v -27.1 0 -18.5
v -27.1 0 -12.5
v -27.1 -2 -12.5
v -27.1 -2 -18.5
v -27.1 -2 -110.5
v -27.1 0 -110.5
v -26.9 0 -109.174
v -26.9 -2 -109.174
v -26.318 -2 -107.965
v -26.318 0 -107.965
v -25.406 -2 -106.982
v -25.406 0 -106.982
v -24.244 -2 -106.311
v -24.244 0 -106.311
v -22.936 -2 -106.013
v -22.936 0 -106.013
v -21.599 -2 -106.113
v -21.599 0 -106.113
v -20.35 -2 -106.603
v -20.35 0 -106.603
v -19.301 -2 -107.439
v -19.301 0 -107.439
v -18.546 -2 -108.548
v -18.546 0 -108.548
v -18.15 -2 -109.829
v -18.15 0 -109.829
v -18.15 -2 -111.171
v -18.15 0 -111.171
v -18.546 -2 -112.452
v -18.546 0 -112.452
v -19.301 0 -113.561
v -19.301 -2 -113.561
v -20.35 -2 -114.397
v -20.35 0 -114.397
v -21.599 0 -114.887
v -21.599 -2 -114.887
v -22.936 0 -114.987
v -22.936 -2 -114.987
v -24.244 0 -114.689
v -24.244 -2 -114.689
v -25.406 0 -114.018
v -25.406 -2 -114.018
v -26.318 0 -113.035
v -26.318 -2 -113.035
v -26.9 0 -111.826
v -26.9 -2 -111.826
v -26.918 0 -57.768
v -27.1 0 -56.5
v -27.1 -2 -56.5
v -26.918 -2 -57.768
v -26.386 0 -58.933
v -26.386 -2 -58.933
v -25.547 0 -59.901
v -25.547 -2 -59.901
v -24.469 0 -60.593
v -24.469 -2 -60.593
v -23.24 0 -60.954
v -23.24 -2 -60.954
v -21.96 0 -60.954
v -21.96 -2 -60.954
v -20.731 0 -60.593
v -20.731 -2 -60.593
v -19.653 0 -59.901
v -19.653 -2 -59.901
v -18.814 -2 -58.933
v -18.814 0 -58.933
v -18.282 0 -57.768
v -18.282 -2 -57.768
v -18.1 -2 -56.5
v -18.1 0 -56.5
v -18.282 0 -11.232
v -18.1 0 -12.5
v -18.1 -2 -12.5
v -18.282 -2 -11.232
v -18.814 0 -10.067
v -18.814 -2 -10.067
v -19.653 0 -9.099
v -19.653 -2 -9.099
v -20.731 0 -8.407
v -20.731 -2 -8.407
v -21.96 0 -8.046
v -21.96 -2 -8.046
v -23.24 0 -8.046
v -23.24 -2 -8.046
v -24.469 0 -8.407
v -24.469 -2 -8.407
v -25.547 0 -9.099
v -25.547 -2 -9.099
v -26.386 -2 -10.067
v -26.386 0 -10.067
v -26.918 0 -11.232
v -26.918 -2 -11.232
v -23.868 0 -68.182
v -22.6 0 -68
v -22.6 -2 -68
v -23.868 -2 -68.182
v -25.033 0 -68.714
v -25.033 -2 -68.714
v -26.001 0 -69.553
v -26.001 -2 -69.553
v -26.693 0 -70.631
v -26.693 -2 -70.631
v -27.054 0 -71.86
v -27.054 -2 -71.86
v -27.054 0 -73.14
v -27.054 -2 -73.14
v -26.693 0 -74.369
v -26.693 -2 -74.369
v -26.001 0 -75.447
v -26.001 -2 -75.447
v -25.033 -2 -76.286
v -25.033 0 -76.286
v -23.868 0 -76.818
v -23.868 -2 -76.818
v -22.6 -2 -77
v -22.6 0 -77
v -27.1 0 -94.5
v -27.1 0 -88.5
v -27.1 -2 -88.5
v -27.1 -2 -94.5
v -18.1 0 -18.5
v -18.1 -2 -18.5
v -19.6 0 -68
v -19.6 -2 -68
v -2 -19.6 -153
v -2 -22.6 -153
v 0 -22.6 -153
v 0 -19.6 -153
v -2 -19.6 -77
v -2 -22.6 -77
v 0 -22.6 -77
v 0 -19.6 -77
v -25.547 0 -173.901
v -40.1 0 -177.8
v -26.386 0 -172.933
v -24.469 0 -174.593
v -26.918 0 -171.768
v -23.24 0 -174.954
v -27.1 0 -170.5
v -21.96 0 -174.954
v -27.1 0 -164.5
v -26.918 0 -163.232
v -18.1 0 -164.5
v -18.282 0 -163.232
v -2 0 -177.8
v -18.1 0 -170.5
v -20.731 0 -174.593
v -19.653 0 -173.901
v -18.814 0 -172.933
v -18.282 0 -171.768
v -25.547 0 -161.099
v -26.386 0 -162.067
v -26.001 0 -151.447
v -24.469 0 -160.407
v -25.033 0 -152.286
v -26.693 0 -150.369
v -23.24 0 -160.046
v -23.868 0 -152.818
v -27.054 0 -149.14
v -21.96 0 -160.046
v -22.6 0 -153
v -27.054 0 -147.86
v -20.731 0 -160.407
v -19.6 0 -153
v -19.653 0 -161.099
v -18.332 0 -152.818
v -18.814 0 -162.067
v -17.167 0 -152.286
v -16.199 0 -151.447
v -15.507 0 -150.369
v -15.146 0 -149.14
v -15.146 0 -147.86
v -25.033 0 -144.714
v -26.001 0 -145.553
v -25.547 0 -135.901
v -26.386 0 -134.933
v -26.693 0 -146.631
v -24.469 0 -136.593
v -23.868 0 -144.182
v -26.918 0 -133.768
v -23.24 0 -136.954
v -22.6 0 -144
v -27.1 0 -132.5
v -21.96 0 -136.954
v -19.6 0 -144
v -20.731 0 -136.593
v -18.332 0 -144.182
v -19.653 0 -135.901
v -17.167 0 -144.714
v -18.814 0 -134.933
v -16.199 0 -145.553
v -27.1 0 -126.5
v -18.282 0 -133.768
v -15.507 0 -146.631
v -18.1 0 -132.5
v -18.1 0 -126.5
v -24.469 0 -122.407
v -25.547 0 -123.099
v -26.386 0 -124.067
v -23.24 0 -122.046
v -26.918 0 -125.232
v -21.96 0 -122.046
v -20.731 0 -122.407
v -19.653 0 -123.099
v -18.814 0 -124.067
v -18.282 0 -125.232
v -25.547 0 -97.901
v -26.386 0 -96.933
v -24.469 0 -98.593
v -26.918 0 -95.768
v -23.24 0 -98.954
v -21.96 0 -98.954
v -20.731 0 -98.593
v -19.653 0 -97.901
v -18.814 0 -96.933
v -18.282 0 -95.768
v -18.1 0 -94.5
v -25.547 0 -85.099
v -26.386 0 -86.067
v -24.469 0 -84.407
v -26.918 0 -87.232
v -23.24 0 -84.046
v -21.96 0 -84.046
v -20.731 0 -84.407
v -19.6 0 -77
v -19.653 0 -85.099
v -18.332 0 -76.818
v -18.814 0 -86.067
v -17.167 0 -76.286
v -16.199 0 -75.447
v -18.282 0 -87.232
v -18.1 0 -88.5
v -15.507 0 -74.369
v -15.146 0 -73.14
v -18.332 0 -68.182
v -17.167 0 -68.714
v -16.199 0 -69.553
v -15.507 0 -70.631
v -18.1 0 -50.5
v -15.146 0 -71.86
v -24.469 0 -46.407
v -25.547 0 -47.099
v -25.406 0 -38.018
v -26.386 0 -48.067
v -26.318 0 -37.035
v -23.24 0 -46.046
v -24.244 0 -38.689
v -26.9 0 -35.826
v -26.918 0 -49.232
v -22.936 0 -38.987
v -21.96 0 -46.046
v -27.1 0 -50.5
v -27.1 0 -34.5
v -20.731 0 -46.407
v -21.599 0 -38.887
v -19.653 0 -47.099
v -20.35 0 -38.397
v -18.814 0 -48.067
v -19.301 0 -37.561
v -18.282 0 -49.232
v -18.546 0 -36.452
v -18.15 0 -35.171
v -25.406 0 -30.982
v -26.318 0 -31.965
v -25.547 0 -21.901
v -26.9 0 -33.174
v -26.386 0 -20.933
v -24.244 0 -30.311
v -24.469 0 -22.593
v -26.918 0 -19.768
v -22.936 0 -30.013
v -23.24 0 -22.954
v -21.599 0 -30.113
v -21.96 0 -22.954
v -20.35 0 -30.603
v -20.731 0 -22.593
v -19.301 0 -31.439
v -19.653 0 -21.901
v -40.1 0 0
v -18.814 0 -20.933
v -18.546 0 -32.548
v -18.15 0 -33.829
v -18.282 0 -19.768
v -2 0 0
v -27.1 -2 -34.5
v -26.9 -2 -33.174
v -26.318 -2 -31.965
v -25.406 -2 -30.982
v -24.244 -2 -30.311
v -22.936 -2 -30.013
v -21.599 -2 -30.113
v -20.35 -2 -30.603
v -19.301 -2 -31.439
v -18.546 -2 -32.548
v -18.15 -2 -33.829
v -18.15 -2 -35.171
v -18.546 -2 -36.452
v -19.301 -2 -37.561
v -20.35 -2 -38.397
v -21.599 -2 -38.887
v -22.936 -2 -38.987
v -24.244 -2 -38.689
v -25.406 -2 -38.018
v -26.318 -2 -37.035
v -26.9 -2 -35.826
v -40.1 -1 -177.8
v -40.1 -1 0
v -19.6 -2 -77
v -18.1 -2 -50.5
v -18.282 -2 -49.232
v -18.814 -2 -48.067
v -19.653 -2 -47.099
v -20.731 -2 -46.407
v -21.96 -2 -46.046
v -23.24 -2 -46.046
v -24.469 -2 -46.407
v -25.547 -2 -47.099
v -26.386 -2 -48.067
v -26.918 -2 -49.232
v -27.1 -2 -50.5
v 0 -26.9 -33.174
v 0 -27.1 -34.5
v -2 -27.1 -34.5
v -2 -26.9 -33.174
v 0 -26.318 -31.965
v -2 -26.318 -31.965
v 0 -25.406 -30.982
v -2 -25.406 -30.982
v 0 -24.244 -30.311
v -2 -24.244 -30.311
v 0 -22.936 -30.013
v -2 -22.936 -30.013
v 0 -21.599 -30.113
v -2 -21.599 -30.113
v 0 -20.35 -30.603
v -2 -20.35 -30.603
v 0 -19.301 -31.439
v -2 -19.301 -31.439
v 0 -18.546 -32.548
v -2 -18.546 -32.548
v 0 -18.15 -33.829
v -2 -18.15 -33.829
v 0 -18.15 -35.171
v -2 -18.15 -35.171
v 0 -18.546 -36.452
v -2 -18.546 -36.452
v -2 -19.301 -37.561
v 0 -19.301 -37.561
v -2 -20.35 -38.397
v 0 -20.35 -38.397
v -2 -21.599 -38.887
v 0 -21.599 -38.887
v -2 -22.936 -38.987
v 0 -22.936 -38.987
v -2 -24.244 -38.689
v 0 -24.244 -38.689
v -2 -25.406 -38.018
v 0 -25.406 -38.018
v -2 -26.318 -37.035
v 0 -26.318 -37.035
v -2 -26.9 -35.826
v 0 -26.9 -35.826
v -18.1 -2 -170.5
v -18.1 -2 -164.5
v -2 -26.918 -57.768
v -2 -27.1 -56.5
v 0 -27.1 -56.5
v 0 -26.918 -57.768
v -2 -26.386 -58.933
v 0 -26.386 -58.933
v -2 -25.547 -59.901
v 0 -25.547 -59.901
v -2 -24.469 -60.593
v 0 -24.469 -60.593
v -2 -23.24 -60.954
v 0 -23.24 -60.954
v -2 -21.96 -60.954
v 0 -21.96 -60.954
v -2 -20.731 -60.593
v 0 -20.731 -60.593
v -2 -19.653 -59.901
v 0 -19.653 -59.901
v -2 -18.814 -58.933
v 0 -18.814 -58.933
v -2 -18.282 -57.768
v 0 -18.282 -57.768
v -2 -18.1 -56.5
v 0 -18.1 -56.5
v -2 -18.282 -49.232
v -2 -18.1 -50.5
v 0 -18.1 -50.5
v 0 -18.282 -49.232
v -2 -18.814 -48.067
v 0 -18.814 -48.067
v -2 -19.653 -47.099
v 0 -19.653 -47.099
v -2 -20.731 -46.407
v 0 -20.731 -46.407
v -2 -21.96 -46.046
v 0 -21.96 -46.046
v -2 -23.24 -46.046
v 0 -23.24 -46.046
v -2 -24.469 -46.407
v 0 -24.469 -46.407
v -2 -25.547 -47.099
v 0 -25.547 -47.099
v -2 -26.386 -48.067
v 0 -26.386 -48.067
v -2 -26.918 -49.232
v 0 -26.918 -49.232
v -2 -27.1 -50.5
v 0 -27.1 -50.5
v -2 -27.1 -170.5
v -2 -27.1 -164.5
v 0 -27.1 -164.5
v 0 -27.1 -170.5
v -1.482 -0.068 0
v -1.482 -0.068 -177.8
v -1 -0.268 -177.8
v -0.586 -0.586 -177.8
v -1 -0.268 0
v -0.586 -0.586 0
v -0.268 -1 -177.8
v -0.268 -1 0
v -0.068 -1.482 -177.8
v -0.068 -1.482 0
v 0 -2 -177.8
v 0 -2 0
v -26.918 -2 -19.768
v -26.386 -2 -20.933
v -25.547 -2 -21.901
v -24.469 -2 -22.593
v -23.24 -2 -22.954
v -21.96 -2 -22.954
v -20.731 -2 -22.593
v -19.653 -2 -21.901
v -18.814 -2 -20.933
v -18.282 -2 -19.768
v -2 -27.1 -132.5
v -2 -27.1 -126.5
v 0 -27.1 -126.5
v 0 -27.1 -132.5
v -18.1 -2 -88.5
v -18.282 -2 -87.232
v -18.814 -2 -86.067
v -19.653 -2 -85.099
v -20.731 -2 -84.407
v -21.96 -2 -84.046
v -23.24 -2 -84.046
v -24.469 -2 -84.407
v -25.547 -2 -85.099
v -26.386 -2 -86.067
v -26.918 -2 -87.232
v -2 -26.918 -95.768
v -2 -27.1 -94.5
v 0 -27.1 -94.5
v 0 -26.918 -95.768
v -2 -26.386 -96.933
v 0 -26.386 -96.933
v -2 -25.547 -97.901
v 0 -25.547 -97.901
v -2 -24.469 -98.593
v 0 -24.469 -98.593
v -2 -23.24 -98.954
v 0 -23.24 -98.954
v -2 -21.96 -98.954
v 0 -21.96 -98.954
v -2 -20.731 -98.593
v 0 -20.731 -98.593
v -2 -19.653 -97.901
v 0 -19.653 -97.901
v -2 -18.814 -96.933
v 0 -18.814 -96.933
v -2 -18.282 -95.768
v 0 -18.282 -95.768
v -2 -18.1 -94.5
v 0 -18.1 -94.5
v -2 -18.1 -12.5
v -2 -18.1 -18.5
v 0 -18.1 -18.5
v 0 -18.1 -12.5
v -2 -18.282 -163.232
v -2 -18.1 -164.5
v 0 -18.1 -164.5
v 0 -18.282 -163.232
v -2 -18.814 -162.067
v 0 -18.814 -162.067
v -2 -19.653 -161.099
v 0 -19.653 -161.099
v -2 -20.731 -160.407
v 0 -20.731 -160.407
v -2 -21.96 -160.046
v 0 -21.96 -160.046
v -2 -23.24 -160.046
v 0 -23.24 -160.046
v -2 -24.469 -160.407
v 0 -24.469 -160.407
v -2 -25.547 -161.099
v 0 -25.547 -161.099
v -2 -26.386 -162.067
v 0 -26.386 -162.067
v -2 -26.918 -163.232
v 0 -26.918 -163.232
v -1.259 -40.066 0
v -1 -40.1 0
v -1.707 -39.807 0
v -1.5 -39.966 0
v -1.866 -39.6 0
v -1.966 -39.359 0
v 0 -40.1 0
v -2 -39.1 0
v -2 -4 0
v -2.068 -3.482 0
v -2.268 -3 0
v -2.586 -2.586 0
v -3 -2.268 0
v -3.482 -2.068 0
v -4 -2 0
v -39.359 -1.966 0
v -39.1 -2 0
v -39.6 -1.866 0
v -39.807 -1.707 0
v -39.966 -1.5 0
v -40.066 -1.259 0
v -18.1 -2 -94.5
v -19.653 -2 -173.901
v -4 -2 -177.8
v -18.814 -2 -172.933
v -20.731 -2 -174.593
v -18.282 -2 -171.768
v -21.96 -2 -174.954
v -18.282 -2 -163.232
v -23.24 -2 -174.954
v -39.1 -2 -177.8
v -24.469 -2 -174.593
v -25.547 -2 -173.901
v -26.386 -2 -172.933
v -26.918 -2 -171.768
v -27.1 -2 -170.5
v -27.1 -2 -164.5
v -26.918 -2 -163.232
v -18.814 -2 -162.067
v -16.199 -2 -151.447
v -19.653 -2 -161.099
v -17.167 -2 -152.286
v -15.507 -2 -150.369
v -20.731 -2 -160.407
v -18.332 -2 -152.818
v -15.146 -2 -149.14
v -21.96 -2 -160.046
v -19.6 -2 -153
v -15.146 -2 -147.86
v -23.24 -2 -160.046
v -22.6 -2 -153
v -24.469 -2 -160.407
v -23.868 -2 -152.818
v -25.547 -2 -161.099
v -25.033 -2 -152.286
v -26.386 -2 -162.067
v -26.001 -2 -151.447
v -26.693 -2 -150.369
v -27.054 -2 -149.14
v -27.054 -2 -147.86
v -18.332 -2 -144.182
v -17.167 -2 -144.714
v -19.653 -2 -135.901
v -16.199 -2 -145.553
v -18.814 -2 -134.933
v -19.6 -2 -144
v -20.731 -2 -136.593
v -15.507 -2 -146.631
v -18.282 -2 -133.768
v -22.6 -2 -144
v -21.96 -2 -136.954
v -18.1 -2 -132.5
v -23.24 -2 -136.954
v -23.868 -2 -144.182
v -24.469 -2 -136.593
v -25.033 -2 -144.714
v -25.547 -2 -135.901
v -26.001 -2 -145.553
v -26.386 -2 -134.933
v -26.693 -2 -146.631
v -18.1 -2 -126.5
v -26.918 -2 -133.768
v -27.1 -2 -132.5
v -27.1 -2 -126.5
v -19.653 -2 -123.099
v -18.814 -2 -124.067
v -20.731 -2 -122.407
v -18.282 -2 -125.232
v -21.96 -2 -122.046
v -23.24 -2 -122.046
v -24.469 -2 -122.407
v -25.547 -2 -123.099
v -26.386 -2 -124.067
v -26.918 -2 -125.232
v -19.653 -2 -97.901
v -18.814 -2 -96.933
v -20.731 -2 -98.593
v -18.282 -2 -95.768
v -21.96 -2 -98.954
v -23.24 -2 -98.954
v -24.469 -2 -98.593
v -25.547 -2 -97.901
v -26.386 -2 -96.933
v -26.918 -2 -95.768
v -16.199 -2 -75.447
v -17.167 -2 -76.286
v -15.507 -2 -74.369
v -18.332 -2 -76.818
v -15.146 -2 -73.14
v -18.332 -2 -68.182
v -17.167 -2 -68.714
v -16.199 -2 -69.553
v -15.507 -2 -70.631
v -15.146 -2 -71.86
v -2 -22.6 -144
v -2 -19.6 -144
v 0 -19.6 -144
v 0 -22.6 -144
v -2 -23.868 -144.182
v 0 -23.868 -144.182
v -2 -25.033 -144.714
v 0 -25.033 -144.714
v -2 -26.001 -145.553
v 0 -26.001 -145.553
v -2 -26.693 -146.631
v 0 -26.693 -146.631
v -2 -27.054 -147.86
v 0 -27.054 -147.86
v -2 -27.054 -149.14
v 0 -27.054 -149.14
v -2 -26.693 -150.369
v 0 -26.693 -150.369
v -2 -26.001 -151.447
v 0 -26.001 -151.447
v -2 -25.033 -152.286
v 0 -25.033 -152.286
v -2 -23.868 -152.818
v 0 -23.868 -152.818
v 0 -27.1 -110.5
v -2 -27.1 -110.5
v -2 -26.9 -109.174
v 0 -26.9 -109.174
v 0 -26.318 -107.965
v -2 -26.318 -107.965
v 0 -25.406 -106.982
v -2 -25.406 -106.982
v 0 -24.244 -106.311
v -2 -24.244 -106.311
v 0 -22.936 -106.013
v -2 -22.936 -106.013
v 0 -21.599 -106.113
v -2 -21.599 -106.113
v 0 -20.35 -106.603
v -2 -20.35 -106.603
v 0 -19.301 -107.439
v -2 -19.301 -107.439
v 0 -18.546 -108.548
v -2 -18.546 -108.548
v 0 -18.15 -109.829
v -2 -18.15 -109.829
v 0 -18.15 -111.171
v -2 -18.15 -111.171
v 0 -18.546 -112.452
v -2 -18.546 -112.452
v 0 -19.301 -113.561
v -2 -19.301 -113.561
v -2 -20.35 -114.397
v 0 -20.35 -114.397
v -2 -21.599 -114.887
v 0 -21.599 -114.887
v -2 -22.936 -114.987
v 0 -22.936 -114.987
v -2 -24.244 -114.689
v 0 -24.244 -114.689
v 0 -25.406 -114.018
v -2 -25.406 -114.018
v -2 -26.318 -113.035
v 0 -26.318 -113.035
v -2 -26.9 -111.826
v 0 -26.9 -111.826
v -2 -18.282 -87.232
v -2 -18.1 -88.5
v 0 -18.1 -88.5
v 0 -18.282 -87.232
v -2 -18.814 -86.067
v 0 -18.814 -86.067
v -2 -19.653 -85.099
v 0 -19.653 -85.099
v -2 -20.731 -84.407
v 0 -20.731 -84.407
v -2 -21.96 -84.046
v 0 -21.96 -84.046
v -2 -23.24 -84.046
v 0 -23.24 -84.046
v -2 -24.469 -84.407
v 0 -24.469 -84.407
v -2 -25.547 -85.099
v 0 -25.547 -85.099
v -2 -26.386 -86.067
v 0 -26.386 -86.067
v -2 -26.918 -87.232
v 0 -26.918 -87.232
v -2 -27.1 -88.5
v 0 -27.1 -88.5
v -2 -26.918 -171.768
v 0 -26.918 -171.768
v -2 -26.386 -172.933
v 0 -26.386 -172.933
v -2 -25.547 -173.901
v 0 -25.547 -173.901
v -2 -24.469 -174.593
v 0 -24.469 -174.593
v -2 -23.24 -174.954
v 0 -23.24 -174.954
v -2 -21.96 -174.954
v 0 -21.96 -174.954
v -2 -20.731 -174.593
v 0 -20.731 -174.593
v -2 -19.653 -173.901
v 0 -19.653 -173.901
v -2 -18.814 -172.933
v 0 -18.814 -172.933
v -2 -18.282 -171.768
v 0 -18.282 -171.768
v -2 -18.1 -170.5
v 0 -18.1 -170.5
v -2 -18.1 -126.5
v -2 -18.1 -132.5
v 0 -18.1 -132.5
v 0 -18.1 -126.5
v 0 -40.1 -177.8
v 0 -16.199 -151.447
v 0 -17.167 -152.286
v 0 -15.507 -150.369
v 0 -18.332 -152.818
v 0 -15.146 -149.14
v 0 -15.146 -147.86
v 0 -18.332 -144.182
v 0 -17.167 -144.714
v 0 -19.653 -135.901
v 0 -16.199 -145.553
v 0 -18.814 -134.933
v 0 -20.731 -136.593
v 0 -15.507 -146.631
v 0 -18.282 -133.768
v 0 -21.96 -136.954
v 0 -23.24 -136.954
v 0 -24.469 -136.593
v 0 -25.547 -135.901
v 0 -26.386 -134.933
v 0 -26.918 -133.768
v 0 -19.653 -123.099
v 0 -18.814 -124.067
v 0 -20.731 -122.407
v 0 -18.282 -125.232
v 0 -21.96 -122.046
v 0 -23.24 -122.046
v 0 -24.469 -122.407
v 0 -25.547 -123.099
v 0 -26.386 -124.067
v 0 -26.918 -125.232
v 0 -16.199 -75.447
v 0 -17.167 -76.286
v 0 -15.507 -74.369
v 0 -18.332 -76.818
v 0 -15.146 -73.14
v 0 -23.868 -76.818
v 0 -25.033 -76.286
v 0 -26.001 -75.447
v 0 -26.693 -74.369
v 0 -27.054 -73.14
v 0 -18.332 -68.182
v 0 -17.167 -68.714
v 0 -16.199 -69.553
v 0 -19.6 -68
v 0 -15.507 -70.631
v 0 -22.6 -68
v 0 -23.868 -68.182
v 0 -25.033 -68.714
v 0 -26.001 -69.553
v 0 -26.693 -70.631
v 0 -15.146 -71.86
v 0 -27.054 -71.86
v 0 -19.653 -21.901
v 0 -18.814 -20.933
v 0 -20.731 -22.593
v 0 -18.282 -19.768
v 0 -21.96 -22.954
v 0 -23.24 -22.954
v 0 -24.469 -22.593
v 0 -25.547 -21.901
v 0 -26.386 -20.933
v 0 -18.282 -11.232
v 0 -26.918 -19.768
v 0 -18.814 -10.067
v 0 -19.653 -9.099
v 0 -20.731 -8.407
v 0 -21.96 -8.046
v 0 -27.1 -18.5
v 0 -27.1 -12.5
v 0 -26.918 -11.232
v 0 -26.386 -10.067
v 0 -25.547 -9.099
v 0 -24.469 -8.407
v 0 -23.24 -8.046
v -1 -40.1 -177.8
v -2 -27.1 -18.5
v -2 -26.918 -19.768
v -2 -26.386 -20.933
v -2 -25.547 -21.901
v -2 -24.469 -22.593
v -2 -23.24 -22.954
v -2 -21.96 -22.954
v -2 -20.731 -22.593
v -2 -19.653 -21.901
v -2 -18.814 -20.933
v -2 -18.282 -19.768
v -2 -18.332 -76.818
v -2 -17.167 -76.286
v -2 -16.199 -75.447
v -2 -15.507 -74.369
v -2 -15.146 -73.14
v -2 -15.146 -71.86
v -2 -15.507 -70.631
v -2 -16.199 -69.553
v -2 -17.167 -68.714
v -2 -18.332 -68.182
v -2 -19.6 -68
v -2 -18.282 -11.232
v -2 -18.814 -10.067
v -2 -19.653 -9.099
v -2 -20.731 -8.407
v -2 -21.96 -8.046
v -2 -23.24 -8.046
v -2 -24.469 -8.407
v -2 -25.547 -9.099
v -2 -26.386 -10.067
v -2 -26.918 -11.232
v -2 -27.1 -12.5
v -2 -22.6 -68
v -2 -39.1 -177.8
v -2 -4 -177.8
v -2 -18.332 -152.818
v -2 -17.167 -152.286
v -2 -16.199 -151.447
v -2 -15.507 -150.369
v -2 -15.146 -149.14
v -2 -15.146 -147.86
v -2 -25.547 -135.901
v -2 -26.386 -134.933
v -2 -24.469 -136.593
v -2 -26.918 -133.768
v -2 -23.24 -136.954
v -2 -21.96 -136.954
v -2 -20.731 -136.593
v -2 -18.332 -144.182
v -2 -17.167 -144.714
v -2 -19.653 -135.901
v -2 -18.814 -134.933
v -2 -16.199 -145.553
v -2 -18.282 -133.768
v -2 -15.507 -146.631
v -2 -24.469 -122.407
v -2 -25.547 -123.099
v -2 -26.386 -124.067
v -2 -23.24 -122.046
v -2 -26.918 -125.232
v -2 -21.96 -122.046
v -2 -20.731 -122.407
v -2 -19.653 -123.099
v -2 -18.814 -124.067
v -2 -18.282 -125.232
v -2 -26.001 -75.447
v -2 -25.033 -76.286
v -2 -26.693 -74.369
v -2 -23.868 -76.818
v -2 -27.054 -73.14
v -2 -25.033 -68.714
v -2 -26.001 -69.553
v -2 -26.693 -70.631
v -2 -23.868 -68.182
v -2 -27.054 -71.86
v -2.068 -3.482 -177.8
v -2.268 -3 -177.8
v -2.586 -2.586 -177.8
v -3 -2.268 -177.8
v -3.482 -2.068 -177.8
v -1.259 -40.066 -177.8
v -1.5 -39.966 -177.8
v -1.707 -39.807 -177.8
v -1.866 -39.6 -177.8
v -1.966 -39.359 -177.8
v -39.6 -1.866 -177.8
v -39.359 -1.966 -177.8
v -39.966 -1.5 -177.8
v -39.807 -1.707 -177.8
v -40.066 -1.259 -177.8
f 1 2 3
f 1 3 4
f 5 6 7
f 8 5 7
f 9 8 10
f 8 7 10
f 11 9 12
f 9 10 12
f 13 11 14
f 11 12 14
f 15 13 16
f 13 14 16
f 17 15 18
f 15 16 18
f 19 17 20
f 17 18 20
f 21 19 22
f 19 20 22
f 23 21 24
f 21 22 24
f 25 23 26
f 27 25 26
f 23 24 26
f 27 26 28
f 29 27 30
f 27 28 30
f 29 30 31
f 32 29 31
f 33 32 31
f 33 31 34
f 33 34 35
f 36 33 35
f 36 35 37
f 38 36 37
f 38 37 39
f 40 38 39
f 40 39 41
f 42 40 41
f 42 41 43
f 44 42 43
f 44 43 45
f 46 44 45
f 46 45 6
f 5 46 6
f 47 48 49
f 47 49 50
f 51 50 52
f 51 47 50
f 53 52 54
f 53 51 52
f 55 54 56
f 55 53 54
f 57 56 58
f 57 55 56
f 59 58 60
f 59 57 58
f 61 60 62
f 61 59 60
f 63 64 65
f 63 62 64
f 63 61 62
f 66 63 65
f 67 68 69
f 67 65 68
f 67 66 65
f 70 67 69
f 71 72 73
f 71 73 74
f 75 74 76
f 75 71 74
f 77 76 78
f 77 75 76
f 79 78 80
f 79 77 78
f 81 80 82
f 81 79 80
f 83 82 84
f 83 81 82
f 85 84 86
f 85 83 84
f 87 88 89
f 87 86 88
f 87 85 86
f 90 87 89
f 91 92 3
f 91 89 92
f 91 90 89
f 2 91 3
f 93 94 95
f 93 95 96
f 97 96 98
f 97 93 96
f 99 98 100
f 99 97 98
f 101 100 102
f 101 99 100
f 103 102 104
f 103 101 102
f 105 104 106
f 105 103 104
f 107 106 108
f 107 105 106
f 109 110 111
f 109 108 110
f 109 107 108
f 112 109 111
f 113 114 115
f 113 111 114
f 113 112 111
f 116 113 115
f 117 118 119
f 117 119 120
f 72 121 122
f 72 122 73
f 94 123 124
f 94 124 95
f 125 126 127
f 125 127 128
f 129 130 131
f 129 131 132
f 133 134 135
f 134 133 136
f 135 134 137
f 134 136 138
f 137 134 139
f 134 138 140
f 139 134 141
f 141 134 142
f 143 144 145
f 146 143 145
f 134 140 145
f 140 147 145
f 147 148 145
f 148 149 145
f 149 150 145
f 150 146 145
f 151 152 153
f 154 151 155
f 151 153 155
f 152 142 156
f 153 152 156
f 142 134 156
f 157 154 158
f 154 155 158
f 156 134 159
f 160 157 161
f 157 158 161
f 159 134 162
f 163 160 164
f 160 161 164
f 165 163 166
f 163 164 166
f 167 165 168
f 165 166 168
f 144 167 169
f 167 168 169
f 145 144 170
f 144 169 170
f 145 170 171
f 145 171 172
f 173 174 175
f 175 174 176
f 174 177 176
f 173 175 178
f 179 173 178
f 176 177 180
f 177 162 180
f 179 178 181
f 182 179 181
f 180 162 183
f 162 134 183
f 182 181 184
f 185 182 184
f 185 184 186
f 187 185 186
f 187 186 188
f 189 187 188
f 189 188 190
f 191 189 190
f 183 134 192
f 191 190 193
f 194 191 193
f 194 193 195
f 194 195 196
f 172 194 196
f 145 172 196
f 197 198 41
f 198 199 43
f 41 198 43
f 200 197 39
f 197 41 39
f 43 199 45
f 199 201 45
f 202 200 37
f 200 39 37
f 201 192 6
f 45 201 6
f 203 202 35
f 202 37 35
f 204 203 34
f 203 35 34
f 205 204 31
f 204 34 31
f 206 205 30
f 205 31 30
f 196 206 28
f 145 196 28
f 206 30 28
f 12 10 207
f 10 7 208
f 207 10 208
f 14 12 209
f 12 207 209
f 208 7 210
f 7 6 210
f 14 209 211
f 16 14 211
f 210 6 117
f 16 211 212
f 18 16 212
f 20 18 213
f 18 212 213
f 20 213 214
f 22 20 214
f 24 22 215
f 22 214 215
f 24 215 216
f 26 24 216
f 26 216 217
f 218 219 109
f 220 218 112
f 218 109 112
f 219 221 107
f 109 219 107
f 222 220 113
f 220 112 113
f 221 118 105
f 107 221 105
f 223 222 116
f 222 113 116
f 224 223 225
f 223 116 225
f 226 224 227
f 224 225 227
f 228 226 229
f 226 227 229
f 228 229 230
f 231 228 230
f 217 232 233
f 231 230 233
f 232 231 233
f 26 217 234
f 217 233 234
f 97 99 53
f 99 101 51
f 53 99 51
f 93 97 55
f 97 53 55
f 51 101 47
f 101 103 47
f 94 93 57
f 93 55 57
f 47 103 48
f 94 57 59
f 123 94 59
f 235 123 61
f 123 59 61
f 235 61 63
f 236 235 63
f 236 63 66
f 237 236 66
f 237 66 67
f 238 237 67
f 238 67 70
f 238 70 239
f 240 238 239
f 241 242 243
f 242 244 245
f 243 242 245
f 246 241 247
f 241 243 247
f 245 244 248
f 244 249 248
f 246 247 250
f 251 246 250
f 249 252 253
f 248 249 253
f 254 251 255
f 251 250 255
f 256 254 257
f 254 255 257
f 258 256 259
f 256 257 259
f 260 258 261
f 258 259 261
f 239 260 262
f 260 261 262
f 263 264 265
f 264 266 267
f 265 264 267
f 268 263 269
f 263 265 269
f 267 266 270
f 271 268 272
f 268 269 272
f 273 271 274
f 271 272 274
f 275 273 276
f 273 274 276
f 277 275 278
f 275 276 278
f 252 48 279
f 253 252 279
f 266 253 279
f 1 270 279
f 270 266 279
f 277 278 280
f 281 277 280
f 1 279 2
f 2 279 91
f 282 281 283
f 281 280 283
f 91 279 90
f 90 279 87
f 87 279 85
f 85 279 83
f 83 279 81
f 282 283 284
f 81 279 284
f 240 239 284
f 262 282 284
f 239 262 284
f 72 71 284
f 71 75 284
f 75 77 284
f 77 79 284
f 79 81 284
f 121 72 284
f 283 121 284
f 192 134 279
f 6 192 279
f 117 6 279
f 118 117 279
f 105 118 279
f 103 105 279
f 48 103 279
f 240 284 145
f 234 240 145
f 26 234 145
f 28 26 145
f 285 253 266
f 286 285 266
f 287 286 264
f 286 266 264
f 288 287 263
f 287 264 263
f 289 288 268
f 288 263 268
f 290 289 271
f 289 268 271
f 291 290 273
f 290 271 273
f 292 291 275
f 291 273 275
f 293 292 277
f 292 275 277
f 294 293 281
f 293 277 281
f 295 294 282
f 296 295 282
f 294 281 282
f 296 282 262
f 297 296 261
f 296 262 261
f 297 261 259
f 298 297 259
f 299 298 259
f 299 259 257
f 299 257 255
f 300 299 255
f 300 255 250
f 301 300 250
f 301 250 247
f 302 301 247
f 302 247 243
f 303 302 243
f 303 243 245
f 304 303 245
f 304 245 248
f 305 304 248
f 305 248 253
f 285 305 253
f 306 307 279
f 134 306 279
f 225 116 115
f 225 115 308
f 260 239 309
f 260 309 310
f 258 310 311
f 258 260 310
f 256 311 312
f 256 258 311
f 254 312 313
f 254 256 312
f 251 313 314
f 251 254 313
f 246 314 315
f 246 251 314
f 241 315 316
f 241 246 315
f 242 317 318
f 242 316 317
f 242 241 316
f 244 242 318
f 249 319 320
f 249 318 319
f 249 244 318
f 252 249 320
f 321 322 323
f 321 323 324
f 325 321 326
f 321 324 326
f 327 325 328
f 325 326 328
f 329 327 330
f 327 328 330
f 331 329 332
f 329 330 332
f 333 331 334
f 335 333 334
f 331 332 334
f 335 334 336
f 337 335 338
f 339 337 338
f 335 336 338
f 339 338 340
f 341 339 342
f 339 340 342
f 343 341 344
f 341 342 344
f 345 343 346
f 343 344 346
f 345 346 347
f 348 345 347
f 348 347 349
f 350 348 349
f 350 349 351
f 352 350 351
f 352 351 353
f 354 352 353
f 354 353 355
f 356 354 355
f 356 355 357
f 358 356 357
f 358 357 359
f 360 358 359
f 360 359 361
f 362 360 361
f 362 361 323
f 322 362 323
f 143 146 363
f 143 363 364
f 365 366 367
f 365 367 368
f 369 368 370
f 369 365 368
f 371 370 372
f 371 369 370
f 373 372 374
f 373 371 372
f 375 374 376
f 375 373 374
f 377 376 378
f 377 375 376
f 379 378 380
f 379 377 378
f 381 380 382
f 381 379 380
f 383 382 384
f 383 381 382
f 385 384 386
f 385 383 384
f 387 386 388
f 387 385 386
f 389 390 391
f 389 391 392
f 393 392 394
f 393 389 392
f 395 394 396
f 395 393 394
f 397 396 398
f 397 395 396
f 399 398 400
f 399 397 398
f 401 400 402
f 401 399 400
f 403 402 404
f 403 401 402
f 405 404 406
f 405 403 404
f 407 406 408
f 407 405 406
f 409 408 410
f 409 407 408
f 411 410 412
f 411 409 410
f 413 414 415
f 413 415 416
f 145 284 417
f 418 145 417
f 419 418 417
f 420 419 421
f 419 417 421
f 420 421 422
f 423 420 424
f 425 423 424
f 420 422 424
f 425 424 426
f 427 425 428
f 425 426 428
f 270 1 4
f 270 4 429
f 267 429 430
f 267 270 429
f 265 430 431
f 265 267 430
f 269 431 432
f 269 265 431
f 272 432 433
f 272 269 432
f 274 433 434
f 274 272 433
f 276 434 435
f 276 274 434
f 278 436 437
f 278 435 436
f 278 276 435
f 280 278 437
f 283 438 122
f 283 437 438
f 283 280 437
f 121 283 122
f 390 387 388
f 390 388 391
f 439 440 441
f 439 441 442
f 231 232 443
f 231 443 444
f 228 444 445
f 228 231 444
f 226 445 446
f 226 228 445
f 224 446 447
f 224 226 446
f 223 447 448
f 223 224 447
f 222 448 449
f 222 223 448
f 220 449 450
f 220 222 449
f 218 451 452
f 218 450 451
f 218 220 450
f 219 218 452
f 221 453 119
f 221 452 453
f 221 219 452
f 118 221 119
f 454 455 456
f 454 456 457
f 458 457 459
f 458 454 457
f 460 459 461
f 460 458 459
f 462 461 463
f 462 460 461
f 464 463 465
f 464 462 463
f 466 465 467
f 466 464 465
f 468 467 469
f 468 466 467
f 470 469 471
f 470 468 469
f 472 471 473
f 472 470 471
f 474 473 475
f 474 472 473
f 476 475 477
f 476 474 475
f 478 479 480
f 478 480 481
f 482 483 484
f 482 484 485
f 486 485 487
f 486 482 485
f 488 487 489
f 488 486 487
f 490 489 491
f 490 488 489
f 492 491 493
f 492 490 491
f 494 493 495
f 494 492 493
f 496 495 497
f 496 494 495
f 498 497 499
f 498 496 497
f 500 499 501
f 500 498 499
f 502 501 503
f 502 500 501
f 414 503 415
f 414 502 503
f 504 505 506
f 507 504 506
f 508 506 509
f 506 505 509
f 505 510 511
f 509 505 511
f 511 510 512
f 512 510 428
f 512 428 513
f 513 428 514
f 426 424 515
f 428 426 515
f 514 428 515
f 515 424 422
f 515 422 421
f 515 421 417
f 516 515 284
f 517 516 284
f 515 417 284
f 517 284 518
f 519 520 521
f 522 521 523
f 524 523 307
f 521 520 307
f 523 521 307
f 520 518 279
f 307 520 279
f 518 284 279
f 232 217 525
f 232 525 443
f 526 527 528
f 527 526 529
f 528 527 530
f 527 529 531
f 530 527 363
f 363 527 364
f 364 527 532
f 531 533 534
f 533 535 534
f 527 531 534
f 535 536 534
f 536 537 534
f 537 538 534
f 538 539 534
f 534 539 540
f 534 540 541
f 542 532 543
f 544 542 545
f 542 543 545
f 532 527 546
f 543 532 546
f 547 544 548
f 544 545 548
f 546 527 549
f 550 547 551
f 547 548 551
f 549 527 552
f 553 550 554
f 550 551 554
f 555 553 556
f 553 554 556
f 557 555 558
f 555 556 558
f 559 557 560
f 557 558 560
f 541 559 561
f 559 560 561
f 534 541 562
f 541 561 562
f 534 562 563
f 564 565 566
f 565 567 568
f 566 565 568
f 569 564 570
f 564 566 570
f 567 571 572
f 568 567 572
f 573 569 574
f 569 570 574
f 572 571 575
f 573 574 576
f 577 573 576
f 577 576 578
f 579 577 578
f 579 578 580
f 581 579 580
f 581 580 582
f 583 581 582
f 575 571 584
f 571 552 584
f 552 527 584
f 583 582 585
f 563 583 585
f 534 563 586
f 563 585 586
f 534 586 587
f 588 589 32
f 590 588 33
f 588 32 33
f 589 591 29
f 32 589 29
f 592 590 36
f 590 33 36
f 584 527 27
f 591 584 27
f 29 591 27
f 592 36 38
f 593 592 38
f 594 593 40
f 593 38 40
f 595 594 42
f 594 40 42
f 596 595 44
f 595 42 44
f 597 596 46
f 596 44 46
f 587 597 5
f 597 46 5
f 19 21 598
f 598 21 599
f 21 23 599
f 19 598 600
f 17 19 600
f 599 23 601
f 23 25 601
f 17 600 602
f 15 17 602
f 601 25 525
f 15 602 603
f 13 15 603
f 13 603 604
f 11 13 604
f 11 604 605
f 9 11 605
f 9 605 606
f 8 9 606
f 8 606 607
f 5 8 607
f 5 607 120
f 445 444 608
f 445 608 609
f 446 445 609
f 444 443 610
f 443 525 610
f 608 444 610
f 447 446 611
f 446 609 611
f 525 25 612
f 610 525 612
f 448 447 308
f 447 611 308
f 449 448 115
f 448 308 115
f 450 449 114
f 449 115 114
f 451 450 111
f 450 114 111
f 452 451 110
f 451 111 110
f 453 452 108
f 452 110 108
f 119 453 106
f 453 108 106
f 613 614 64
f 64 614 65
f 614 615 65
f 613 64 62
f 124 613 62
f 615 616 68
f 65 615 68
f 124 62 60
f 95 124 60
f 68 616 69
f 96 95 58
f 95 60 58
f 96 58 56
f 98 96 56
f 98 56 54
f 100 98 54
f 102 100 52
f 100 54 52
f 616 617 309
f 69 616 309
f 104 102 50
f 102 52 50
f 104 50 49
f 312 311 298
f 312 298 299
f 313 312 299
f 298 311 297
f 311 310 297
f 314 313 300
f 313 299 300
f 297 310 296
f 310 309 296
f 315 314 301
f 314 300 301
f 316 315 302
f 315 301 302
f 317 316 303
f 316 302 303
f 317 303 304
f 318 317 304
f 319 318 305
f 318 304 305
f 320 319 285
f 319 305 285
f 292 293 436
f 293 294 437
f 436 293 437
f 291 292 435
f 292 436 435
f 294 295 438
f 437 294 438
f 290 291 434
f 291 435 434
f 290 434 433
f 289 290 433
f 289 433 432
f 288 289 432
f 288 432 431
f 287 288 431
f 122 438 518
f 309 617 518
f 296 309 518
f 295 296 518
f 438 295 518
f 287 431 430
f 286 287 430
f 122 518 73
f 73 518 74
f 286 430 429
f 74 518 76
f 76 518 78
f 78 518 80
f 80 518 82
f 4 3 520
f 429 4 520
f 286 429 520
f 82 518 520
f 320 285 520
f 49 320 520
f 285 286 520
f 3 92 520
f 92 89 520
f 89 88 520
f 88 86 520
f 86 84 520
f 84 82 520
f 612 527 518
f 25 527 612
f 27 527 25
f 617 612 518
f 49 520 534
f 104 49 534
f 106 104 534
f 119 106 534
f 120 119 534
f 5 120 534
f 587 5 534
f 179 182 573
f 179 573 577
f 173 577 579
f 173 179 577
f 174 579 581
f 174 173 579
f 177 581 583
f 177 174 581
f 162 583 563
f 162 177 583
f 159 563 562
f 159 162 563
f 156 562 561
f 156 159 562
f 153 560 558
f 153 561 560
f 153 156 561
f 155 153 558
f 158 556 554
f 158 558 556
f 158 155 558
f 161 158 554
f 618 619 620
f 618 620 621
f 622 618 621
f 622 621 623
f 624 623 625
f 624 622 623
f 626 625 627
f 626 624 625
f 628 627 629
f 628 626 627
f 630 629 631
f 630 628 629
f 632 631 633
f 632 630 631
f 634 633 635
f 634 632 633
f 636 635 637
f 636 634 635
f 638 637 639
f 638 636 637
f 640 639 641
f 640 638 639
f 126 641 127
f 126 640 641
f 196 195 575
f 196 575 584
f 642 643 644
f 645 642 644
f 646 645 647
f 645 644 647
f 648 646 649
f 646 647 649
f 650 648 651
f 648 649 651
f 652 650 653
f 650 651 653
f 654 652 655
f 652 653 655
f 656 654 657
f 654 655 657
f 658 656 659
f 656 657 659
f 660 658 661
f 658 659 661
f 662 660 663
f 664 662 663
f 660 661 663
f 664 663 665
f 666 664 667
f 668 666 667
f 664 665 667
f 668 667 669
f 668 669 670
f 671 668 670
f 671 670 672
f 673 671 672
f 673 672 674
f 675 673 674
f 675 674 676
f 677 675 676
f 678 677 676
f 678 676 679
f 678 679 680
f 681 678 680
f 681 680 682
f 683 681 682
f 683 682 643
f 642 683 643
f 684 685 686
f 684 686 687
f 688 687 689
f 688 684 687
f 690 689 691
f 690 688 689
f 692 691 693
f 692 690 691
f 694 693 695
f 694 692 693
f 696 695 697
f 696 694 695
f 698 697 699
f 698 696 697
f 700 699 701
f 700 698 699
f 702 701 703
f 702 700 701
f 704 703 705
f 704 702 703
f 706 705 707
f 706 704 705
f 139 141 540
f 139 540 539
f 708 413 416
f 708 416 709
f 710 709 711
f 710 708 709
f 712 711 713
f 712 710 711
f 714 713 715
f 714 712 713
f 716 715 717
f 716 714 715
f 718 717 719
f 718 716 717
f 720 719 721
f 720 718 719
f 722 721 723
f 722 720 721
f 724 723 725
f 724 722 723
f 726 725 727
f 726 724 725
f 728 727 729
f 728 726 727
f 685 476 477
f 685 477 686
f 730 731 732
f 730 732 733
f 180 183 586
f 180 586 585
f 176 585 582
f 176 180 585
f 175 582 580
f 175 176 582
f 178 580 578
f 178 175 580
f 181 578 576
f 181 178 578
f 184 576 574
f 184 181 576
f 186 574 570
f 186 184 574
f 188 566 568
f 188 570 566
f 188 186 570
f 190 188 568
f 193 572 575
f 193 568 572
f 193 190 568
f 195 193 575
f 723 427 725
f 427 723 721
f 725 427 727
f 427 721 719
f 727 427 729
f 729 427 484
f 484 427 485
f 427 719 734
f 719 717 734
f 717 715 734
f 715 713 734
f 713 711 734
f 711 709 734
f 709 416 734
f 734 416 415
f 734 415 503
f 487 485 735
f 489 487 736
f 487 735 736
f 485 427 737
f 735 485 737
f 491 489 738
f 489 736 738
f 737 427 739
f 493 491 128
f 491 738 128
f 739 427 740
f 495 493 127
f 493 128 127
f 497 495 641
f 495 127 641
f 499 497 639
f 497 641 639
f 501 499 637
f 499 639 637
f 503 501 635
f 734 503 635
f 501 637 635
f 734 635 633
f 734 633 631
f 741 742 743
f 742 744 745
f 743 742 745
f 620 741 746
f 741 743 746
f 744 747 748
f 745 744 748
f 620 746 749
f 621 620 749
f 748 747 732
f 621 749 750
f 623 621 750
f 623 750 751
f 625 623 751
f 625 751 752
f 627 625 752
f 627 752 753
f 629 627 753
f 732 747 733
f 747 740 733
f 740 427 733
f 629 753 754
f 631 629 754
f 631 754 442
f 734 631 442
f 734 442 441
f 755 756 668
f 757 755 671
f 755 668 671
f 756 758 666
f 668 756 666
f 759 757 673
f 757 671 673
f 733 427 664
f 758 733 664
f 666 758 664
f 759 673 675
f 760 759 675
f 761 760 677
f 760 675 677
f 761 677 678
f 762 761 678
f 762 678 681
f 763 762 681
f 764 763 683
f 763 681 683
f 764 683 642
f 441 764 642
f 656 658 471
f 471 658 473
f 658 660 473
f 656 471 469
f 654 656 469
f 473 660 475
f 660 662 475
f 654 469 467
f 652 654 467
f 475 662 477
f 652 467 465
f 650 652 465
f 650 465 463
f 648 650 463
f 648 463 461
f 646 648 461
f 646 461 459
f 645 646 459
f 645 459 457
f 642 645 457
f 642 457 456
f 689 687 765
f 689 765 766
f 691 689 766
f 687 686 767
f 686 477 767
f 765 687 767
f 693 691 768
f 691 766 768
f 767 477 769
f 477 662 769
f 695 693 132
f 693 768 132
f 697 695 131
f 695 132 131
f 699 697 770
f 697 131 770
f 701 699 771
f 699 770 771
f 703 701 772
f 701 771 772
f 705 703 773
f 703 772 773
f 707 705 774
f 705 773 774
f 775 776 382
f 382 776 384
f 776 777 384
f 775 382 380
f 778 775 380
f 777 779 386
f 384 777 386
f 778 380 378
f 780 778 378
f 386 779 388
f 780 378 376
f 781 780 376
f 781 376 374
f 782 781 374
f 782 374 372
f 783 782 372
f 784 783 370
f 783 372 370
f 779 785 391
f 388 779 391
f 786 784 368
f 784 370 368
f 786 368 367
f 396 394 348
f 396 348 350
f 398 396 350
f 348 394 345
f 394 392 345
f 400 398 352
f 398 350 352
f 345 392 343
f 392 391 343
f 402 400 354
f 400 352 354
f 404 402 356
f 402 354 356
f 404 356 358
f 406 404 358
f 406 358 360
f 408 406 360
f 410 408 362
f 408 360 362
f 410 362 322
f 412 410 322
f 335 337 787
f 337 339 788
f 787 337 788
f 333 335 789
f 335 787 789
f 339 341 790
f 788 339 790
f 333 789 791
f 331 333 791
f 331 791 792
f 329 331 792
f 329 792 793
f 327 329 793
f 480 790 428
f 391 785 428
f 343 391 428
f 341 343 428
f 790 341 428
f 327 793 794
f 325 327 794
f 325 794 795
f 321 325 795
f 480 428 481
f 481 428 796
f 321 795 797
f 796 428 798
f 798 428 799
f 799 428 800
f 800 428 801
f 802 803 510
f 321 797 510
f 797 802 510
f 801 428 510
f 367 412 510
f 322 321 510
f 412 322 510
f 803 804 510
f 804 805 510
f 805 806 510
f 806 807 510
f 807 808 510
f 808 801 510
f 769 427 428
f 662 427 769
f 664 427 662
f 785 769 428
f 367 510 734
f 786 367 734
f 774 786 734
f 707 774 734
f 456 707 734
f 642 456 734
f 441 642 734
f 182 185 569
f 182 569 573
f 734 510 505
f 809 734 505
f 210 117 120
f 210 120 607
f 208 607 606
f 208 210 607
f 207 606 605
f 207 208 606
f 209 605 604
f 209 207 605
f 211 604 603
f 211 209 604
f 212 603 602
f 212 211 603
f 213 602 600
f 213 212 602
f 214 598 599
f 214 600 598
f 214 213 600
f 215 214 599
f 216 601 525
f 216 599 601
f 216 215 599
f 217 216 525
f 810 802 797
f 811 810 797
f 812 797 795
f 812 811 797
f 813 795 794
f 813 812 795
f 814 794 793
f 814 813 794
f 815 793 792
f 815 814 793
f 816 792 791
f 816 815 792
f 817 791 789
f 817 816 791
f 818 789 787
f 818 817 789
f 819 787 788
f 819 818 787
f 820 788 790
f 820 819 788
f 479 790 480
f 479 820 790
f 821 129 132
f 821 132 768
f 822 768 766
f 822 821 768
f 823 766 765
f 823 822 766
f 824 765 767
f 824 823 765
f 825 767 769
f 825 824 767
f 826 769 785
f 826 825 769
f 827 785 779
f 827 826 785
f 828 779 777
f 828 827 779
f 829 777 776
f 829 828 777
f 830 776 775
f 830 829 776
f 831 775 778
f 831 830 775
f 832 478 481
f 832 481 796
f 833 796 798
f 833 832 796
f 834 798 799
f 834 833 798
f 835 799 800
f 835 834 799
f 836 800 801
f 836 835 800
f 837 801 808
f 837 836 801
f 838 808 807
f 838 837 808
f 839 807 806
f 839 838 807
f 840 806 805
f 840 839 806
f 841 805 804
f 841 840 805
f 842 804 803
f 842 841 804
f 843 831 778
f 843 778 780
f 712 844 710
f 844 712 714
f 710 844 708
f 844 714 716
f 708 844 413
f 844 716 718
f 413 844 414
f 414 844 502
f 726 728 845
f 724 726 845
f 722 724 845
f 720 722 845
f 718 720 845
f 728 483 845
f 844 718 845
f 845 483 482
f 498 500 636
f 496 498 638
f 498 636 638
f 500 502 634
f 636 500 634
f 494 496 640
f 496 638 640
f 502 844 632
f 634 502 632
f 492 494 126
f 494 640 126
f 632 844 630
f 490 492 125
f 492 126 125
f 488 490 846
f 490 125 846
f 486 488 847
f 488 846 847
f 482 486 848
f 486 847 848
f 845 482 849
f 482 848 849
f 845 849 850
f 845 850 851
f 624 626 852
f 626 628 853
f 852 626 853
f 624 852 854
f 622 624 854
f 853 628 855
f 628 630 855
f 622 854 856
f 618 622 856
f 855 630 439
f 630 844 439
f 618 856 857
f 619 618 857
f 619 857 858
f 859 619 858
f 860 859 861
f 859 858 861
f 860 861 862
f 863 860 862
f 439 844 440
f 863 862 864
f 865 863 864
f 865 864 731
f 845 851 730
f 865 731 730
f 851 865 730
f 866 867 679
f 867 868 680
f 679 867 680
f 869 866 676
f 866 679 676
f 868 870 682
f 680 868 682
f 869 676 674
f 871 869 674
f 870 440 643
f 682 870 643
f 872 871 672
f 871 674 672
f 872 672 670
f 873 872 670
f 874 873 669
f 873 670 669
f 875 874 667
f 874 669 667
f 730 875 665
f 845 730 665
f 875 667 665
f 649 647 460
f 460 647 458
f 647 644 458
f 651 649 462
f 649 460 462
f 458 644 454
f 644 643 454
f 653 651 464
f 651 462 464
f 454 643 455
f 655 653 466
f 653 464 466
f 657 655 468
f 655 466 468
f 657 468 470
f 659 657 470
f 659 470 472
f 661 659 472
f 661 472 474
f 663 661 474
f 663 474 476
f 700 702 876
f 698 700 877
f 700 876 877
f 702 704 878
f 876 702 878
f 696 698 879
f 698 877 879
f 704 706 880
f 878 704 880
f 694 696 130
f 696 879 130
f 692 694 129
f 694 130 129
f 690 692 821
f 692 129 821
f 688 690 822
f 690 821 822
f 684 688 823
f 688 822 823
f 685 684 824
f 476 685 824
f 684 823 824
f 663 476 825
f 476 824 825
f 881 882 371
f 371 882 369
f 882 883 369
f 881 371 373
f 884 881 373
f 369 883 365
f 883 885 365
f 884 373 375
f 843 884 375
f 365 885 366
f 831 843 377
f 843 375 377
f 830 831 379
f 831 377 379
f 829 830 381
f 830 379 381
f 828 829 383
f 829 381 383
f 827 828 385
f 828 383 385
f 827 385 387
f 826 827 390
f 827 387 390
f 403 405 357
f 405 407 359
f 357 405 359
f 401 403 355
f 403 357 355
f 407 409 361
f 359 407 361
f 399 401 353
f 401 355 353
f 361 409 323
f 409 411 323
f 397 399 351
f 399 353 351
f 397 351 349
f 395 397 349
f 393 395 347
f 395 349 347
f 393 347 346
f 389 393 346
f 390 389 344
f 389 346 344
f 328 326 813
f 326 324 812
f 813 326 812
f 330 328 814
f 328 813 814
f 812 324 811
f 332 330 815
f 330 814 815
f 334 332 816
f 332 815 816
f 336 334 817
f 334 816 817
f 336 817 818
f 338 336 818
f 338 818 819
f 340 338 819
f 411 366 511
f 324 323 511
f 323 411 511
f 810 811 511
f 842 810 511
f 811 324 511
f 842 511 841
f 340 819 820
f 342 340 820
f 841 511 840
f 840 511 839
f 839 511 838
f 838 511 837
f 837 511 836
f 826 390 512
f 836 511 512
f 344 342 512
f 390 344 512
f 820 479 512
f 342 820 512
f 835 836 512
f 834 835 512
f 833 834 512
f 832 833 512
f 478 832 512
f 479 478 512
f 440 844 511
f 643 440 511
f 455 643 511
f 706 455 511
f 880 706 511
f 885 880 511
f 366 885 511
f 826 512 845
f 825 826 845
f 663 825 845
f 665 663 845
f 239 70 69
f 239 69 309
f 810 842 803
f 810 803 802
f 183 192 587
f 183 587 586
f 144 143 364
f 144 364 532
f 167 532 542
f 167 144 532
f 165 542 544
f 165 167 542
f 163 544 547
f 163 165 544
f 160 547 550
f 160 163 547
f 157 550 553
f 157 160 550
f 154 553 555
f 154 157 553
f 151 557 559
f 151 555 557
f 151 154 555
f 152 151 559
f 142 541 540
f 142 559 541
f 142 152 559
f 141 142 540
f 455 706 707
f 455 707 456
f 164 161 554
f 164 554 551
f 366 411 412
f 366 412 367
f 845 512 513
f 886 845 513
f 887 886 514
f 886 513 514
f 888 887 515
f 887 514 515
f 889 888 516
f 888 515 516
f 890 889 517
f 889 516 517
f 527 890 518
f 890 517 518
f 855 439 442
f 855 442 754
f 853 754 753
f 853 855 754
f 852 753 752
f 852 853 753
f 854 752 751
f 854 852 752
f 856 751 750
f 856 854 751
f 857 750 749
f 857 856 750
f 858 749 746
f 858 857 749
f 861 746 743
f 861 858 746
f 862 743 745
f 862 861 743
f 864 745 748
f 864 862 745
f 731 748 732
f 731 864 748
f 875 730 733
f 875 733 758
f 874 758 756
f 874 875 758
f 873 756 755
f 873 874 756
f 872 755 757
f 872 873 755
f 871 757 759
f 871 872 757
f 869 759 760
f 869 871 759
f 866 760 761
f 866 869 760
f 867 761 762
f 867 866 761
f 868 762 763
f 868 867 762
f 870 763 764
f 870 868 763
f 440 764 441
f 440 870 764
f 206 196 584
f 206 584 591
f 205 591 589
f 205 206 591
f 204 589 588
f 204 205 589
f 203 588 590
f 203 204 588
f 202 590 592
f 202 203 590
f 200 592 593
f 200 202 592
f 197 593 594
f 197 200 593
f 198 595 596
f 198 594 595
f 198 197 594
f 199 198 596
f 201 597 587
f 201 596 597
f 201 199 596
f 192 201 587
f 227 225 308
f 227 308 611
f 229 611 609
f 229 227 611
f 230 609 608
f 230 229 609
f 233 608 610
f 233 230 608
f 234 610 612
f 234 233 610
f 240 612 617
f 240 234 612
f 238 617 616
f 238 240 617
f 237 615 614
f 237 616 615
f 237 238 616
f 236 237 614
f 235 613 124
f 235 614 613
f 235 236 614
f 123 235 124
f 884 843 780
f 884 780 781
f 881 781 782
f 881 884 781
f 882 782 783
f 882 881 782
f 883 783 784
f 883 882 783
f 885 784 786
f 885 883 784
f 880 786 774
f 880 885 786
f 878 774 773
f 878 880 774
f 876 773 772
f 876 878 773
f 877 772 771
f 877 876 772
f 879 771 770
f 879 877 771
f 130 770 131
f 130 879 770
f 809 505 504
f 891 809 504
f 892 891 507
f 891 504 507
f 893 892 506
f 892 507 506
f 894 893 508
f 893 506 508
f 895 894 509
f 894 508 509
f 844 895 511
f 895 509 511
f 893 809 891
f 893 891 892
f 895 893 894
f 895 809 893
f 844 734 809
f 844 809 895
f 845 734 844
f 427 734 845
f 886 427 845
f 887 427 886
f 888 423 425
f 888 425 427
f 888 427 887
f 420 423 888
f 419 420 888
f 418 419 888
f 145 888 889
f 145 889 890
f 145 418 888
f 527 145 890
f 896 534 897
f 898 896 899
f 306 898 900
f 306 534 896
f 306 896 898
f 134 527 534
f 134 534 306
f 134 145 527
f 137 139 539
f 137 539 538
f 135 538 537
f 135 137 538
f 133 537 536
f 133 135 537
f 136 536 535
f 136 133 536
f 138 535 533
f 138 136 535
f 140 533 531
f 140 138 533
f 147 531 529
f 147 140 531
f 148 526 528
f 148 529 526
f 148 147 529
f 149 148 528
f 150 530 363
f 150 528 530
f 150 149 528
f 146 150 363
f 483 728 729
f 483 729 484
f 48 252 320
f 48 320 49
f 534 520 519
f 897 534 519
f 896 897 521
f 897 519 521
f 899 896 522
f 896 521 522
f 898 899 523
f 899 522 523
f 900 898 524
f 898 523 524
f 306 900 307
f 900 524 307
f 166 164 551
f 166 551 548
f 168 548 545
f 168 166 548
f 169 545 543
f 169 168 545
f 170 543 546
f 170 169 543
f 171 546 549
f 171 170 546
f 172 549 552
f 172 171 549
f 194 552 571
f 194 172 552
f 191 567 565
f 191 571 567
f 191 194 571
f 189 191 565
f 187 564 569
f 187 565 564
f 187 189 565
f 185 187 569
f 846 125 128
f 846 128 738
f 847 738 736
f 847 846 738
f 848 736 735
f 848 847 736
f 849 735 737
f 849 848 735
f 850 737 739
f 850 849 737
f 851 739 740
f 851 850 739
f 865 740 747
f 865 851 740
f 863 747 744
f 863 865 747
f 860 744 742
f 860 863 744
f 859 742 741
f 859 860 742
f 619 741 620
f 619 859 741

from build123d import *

# Parameters (mm, degrees)
STRUCTURAL_MEMBER1_DEPTH        = 177.8
SLOT_DEPTH                      = 187.62491795
SKETCH4_R                       = 4.5
HOLE_DEPTH                      = 187.62491795
VERT_SLOT_DEPTH                 = 187.62491795
SLOT_PATTERN_COUNT              = 5
SLOT_PATTERN_PITCH              = 38
HOLE_PATTERN_COUNT              = 2
HOLE_PATTERN_PITCH              = 76
LPATTERN1_COUNT                 = 2
LPATTERN1_PITCH                 = 76
OTHER_SIDE_CUTS_COUNT           = 2
OTHER_SIDE_CUTS_ANGLE           = 90
OTHER_SIDE_CUTS_COPY_1_DEPTH    = 187.62491795
OTHER_SIDE_CUTS_COPY_2_DEPTH    = 187.62491795
OTHER_SIDE_CUTS_COPY_3_DEPTH    = 187.62491795
OTHER_SIDE_CUTS_COPY_4_DEPTH    = 187.62491795
OTHER_SIDE_CUTS_COPY_5_SKETCH_R = 4.5
OTHER_SIDE_CUTS_COPY_5_DEPTH    = 187.62491795
OTHER_SIDE_CUTS_COPY_6_DEPTH    = 187.62491795


with BuildPart() as part:
    # Sketch13 → Structural Member1 (new body)
    with BuildSketch(Plane(origin=(0, 0, 0), x_dir=(-1, 0, 0), z_dir=(0, 0, -1))):
        with BuildLine():
            Line((40.1, 0), (2, 0))
            ThreePointArc((2, 0), (0.585786438, -0.585786438), (0, -2))
            Line((0, -2), (0, -40.1))
            Line((0, -40.1), (1, -40.1))
            ThreePointArc((1, -40.1), (1.707106781, -39.807106781), (2, -39.1))
            Line((2, -39.1), (2, -4))
            ThreePointArc((2, -4), (2.585786438, -2.585786438), (4, -2))
            Line((4, -2), (39.1, -2))
            ThreePointArc((39.1, -2), (39.807106781, -1.707106781), (40.1, -1))
            Line((40.1, -1), (40.1, 0))
        make_face()
    extrude(amount=STRUCTURAL_MEMBER1_DEPTH)

    # Sketch3 → Slot (cut, through all)
    with BuildSketch(Plane(origin=(0, 0, 0), x_dir=(1, 0, 0), z_dir=(0, 1, 0))):
        with BuildLine():
            Line((-27.1, 12.5), (-27.1, 18.5))
            ThreePointArc((-27.1, 18.5), (-22.6, 23), (-18.1, 18.5))
            Line((-18.1, 18.5), (-18.1, 12.5))
            ThreePointArc((-18.1, 12.5), (-22.6, 8), (-27.1, 12.5))
        make_face()
    slot = extrude(amount=-SLOT_DEPTH, mode=Mode.SUBTRACT)

    # Sketch4 → Hole (cut, through all)
    with BuildSketch(Plane(origin=(0, 0, 0), x_dir=(1, 0, 0), z_dir=(0, 1, 0))):
        with Locations(Location((-22.6, 34.5, 0), (0, 0, 180))):
            Circle(SKETCH4_R)
    hole = extrude(amount=-HOLE_DEPTH, mode=Mode.SUBTRACT)

    # Sketch14 → Vert Slot (cut, through all)
    with BuildSketch(Plane(origin=(0, 0, 0), x_dir=(1, 0, 0), z_dir=(0, 1, 0))):
        with BuildLine():
            Line((-19.6, 68), (-22.6, 68))
            ThreePointArc((-22.6, 68), (-27.1, 72.5), (-22.6, 77))
            Line((-22.6, 77), (-19.6, 77))
            ThreePointArc((-19.6, 77), (-15.1, 72.5), (-19.6, 68))
        make_face()
    vert_slot = extrude(amount=-VERT_SLOT_DEPTH, mode=Mode.SUBTRACT)

    # Slot Pattern: Slot ×5
    with Locations(*[(0, 0, -i * SLOT_PATTERN_PITCH) for i in range(1, SLOT_PATTERN_COUNT)]):
        add(slot, mode=Mode.SUBTRACT)

    # Hole Pattern: Hole ×2
    with Locations(*[(0, 0, -i * HOLE_PATTERN_PITCH) for i in range(1, HOLE_PATTERN_COUNT)]):
        add(hole, mode=Mode.SUBTRACT)

    # LPattern1: Vert Slot ×2
    with Locations(*[(0, 0, -i * LPATTERN1_PITCH) for i in range(1, LPATTERN1_COUNT)]):
        add(vert_slot, mode=Mode.SUBTRACT)

    # Other side cuts: Slot, Hole, Vert Slot ×2 about axis
    other_side_cuts_axis = Axis((-4, -4, 0), (0, 0, 1))
    add([slot.rotate(other_side_cuts_axis, i * OTHER_SIDE_CUTS_ANGLE / (OTHER_SIDE_CUTS_COUNT - 1)) for i in range(1, OTHER_SIDE_CUTS_COUNT)], mode=Mode.SUBTRACT)
    add([hole.rotate(other_side_cuts_axis, i * OTHER_SIDE_CUTS_ANGLE / (OTHER_SIDE_CUTS_COUNT - 1)) for i in range(1, OTHER_SIDE_CUTS_COUNT)], mode=Mode.SUBTRACT)
    add([vert_slot.rotate(other_side_cuts_axis, i * OTHER_SIDE_CUTS_ANGLE / (OTHER_SIDE_CUTS_COUNT - 1)) for i in range(1, OTHER_SIDE_CUTS_COUNT)], mode=Mode.SUBTRACT)

    # Other side cuts copy 1 sketch → Other side cuts copy 1 (cut, through all)
    with BuildSketch(Plane(origin=(-8, 0, -38), x_dir=(0, 1, 0), z_dir=(-1, 0, 0))):
        with BuildLine():
            Line((-27.1, 12.5), (-27.1, 18.5))
            ThreePointArc((-27.1, 18.5), (-22.6, 23), (-18.1, 18.5))
            Line((-18.1, 18.5), (-18.1, 12.5))
            ThreePointArc((-18.1, 12.5), (-22.6, 8), (-27.1, 12.5))
        make_face()
    extrude(amount=-OTHER_SIDE_CUTS_COPY_1_DEPTH, mode=Mode.SUBTRACT)

    # Other side cuts copy 2 sketch → Other side cuts copy 2 (cut, through all)
    with BuildSketch(Plane(origin=(-8, 0, -76), x_dir=(0, 1, 0), z_dir=(-1, 0, 0))):
        with BuildLine():
            Line((-27.1, 12.5), (-27.1, 18.5))
            ThreePointArc((-27.1, 18.5), (-22.6, 23), (-18.1, 18.5))
            Line((-18.1, 18.5), (-18.1, 12.5))
            ThreePointArc((-18.1, 12.5), (-22.6, 8), (-27.1, 12.5))
        make_face()
    extrude(amount=-OTHER_SIDE_CUTS_COPY_2_DEPTH, mode=Mode.SUBTRACT)

    # Other side cuts copy 3 sketch → Other side cuts copy 3 (cut, through all)
    with BuildSketch(Plane(origin=(-8, 0, -114), x_dir=(0, 1, 0), z_dir=(-1, 0, 0))):
        with BuildLine():
            Line((-27.1, 12.5), (-27.1, 18.5))
            ThreePointArc((-27.1, 18.5), (-22.6, 23), (-18.1, 18.5))
            Line((-18.1, 18.5), (-18.1, 12.5))
            ThreePointArc((-18.1, 12.5), (-22.6, 8), (-27.1, 12.5))
        make_face()
    extrude(amount=-OTHER_SIDE_CUTS_COPY_3_DEPTH, mode=Mode.SUBTRACT)

    # Other side cuts copy 4 sketch → Other side cuts copy 4 (cut, through all)
    with BuildSketch(Plane(origin=(-8, 0, -152), x_dir=(0, 1, 0), z_dir=(-1, 0, 0))):
        with BuildLine():
            Line((-27.1, 12.5), (-27.1, 18.5))
            ThreePointArc((-27.1, 18.5), (-22.6, 23), (-18.1, 18.5))
            Line((-18.1, 18.5), (-18.1, 12.5))
            ThreePointArc((-18.1, 12.5), (-22.6, 8), (-27.1, 12.5))
        make_face()
    extrude(amount=-OTHER_SIDE_CUTS_COPY_4_DEPTH, mode=Mode.SUBTRACT)

    # Other side cuts copy 5 sketch → Other side cuts copy 5 (cut, through all)
    with BuildSketch(Plane(origin=(-8, 0, -76), x_dir=(0, 1, 0), z_dir=(-1, 0, 0))):
        with Locations(Location((-22.6, 34.5, 0), (0, 0, 180))):
            Circle(OTHER_SIDE_CUTS_COPY_5_SKETCH_R)
    extrude(amount=-OTHER_SIDE_CUTS_COPY_5_DEPTH, mode=Mode.SUBTRACT)

    # Other side cuts copy 6 sketch → Other side cuts copy 6 (cut, through all)
    with BuildSketch(Plane(origin=(-8, 0, -76), x_dir=(0, 1, 0), z_dir=(-1, 0, 0))):
        with BuildLine():
            Line((-19.6, 68), (-22.6, 68))
            ThreePointArc((-22.6, 68), (-27.1, 72.5), (-22.6, 77))
            Line((-22.6, 77), (-19.6, 77))
            ThreePointArc((-19.6, 77), (-15.1, 72.5), (-19.6, 68))
        make_face()
    extrude(amount=-OTHER_SIDE_CUTS_COPY_6_DEPTH, mode=Mode.SUBTRACT)


solid = part.part
